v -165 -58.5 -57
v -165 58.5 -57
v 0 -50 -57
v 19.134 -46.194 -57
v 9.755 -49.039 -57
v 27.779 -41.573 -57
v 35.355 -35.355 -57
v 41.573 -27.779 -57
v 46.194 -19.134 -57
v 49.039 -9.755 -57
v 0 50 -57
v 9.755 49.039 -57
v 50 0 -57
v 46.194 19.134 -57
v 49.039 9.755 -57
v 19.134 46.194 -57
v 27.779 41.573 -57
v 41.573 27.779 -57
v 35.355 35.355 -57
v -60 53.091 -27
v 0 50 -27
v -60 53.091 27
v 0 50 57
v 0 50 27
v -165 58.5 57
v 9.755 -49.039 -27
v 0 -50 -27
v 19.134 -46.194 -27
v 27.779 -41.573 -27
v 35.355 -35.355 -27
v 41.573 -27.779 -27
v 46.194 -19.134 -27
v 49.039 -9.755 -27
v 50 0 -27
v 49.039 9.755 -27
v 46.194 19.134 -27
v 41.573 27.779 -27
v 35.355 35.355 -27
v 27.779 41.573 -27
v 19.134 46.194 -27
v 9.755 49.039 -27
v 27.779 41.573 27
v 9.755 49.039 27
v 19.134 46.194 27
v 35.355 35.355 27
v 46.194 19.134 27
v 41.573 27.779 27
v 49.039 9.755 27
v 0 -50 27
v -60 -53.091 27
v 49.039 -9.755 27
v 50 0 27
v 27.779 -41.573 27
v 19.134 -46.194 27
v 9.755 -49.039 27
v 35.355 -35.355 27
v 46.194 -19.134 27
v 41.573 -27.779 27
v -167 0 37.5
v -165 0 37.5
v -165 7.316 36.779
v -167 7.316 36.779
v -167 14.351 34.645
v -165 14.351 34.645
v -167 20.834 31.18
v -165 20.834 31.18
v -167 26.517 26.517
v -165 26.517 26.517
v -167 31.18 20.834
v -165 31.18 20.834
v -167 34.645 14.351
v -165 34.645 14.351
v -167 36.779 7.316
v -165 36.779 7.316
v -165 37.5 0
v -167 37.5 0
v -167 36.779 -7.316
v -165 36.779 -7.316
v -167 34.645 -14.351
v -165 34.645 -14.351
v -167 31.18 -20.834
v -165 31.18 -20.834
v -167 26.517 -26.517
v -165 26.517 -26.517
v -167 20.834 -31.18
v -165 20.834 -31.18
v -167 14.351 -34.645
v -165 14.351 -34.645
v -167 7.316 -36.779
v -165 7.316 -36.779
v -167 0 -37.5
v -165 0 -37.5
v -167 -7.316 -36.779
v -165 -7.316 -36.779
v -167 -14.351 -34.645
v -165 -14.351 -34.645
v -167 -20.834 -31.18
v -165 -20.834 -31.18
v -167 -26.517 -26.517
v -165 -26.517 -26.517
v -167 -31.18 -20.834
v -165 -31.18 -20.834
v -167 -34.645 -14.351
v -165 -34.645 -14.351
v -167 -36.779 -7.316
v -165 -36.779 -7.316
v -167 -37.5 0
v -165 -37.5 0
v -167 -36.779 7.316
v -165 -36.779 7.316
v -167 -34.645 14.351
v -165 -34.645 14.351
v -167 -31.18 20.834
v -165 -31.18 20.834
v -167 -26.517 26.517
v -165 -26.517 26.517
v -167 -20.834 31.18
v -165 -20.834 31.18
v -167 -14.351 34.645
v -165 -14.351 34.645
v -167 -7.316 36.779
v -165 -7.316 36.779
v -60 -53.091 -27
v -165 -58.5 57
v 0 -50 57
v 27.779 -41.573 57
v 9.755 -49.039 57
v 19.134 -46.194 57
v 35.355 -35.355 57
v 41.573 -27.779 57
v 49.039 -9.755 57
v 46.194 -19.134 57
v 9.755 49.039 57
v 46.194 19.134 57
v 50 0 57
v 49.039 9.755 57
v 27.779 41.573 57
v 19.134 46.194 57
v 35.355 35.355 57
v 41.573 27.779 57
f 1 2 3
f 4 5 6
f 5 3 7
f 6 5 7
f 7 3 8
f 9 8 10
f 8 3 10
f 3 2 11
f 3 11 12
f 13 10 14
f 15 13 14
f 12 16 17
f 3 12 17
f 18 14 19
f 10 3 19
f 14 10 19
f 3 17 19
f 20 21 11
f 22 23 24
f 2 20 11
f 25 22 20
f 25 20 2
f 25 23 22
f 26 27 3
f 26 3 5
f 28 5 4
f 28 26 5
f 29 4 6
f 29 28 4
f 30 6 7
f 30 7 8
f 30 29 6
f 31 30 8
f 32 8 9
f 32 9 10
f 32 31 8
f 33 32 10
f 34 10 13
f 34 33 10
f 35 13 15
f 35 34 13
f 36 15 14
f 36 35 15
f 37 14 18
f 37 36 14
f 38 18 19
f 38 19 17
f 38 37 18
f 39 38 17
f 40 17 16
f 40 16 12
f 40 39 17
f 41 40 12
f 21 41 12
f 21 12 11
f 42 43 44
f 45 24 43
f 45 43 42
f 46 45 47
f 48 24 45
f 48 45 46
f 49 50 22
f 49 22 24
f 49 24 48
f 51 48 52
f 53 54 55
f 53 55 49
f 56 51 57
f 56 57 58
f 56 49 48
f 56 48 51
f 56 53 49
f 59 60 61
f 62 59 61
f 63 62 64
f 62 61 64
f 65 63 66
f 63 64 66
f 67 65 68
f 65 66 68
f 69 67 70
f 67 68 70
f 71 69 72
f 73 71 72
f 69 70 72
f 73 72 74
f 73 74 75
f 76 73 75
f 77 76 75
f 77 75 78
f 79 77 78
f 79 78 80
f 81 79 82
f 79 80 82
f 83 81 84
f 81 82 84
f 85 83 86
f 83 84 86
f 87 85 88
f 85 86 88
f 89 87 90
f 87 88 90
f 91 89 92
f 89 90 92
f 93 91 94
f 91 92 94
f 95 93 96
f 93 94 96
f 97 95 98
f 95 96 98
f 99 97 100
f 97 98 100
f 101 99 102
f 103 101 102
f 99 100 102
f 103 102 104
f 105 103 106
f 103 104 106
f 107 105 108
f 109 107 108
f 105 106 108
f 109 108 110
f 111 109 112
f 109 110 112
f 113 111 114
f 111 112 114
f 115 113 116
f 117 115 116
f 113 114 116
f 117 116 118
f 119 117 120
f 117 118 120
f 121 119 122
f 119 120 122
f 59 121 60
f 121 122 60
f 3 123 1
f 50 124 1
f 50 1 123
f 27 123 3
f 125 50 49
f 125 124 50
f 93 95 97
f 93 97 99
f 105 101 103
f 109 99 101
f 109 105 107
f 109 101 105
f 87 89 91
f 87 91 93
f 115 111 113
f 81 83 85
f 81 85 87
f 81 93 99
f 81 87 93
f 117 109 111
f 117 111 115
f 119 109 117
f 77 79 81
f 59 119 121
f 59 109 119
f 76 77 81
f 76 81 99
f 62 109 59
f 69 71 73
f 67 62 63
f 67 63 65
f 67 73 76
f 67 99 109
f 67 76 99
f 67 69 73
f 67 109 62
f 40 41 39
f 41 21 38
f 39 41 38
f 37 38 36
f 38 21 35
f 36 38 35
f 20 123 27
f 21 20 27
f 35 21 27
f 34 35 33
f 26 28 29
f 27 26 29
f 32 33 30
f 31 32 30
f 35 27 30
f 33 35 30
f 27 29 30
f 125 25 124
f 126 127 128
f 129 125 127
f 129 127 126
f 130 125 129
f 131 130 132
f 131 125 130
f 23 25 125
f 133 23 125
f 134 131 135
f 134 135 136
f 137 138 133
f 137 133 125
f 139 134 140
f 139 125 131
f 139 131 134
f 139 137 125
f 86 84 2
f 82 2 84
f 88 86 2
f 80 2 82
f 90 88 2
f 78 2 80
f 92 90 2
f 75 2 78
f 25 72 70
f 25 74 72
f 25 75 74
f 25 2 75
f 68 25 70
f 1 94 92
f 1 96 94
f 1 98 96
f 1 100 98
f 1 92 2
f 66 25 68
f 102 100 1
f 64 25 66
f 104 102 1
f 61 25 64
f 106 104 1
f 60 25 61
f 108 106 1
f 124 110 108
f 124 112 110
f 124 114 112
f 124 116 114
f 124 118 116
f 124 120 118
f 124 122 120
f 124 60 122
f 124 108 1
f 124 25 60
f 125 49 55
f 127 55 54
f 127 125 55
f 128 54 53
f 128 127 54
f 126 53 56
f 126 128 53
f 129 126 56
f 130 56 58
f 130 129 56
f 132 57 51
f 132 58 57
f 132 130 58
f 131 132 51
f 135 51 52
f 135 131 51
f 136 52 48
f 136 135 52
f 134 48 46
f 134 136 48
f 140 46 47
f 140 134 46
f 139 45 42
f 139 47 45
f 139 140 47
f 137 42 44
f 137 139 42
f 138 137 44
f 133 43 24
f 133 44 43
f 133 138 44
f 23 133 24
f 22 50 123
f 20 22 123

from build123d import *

# Parameters (mm, degrees)
BOSS_EXTRUDE1_DEPTH     = 57
SKETCH2_R               = 37.5
BOSS_EXTRUDE2_DEPTH     = 2
CUT_EXTRUDE2_DEPTH      = 186.90387301
CUT_EXTRUDE2_DEPTH_BACK = 186.90387301
SKETCH3_W               = 110
SKETCH3_H               = 54


with BuildPart() as part:
    # Sketch1 → Boss-Extrude1 (new, symmetric)
    with BuildSketch(Plane.XY):
        with BuildLine():
            Line((0, 50), (-165, 58.5))
            Line((-165, 58.5), (-165, -58.5))
            Line((-165, -58.5), (0, -50))
            ThreePointArc((0, -50), (50, 0), (0, 50))
        make_face()
    extrude(amount=BOSS_EXTRUDE1_DEPTH, both=True)

    # Sketch2 → Boss-Extrude2 (add)
    with BuildSketch(Plane.ZY.offset(165)):
        Circle(SKETCH2_R)
    extrude(amount=BOSS_EXTRUDE2_DEPTH)

    # Sketch3 → Cut-Extrude2 (cut, two sides: drawn at the far end of the back side and taken through both)
    with BuildSketch(Plane(origin=(0, 0, 0), x_dir=(1, 0, 0), z_dir=(0, 1, 0)).offset(-CUT_EXTRUDE2_DEPTH_BACK)):
        with Locations((-5, 0)):
            Rectangle(SKETCH3_W, SKETCH3_H)
    extrude(amount=CUT_EXTRUDE2_DEPTH + CUT_EXTRUDE2_DEPTH_BACK, mode=Mode.SUBTRACT)


solid = part.part
